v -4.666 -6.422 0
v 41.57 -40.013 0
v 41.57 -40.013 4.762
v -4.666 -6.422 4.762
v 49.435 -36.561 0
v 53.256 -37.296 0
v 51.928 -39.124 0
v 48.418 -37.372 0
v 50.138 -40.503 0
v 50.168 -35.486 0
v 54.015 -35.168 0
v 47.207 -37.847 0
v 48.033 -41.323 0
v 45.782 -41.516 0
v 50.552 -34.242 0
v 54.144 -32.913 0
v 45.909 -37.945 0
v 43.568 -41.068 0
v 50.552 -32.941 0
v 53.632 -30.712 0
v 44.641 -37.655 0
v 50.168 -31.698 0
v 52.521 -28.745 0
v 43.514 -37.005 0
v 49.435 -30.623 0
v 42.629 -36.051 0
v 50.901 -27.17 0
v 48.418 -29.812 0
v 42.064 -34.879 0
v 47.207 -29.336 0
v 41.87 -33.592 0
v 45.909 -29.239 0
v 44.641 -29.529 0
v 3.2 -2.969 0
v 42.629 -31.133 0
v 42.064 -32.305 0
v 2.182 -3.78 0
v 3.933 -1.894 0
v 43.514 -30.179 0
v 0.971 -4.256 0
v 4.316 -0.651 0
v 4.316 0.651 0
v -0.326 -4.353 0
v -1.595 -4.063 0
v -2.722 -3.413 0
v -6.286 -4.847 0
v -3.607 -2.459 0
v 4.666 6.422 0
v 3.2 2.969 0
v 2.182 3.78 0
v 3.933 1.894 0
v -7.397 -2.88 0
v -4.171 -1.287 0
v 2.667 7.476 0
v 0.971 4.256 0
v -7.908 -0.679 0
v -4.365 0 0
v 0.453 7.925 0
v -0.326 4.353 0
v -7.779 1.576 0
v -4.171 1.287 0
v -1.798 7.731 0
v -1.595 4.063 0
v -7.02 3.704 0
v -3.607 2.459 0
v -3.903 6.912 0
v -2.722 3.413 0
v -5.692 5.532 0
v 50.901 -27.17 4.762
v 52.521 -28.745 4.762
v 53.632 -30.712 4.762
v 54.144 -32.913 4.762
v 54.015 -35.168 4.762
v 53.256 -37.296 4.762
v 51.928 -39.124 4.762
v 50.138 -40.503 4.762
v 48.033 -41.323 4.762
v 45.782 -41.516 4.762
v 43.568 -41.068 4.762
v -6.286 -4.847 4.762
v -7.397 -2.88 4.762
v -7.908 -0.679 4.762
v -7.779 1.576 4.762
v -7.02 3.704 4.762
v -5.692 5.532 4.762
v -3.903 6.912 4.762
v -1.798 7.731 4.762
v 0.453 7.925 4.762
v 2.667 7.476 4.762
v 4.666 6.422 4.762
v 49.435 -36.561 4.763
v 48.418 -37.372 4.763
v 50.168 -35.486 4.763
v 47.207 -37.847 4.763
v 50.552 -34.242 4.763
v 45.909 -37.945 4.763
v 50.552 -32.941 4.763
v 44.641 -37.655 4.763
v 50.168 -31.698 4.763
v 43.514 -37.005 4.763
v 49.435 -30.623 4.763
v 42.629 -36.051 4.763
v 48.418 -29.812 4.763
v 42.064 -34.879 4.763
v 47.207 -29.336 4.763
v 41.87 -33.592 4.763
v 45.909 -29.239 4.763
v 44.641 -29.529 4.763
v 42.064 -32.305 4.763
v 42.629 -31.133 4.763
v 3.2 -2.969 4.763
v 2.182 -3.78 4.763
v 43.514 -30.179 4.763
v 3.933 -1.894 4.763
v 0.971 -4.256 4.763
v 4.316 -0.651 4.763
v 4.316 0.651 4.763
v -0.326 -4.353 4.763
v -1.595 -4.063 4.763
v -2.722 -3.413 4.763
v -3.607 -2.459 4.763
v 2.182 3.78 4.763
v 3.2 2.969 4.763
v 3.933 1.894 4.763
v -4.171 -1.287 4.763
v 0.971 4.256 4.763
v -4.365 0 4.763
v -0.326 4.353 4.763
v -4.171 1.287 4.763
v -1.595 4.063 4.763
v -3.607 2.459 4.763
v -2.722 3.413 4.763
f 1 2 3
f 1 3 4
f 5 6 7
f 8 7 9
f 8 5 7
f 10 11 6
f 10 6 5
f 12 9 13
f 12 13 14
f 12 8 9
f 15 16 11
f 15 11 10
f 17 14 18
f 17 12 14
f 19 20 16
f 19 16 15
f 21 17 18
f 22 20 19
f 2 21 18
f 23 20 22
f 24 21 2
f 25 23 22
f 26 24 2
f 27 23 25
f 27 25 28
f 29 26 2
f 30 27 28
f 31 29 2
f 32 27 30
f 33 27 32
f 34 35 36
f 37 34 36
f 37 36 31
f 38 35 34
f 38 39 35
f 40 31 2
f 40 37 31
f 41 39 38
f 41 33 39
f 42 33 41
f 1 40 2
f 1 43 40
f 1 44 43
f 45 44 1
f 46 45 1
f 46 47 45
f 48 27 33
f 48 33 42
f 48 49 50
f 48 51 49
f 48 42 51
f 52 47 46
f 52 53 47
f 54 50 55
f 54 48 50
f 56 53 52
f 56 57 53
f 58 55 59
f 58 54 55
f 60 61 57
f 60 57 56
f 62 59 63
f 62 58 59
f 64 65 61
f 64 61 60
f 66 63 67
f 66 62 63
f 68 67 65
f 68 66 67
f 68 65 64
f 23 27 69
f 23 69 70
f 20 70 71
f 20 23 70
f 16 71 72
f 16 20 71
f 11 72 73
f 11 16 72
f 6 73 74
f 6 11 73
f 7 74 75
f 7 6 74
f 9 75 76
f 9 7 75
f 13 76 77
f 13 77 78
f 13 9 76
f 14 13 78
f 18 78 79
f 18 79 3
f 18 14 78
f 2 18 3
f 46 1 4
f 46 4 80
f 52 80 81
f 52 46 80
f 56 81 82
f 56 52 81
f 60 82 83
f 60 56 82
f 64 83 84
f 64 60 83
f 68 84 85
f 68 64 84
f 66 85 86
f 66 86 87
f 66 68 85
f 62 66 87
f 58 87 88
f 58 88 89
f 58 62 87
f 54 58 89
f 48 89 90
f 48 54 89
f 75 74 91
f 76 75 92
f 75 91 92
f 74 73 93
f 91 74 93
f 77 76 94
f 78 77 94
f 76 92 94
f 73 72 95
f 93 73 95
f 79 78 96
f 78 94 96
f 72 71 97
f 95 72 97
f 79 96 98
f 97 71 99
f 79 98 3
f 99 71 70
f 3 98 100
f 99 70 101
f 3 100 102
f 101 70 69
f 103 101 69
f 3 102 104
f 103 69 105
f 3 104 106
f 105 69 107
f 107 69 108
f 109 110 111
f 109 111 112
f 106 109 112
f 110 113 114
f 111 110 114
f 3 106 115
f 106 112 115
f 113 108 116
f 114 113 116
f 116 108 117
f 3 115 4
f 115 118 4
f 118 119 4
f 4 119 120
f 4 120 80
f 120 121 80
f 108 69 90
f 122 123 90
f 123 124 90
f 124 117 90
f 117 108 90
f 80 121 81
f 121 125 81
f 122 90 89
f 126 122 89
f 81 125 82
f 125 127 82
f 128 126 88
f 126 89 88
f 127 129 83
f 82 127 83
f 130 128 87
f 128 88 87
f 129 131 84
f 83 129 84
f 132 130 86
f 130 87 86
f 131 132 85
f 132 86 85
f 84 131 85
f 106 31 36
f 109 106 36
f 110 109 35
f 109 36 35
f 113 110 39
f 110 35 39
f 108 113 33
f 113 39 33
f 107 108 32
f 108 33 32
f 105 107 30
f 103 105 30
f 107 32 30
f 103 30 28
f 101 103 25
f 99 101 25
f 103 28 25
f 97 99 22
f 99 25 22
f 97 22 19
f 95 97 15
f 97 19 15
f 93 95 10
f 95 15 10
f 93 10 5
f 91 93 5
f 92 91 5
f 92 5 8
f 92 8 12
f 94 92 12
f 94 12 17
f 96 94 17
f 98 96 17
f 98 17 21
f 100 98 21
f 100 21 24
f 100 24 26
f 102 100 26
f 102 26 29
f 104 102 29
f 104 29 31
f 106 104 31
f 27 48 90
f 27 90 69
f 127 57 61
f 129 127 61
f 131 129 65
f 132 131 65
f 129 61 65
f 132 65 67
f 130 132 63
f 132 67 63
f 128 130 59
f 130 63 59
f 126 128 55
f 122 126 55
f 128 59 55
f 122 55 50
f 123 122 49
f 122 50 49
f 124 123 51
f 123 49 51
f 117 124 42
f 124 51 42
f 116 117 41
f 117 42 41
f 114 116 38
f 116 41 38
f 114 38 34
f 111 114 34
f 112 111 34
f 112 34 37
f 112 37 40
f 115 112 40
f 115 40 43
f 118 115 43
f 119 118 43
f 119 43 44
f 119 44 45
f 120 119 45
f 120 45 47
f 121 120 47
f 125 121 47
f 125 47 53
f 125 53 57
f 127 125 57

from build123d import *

# Parameters (mm, degrees)
BOSS_EXTRUDE1_DEPTH          = 4.7625
F_5_16_CLEARANCE_HOLE1_D     = 8.72998
F_5_16_CLEARANCE_HOLE2_D     = 8.72998
F_5_16_CLEARANCE_HOLE2_DEPTH = 50.8
F_5_16_CLEARANCE_HOLE2_TIP   = 2.622750593


with BuildPart() as part:
    # Sketch1 → Boss-Extrude1 (new body)
    with BuildSketch(Plane.XY):
        with BuildLine():
            Line((4.66554544, 6.421572393), (50.900866669, -27.170354776))
            ThreePointArc((50.900866669, -27.170354776), (52.656893621, -38.257472609), (41.569775788, -40.013499561))
            Line((41.569775788, -40.013499561), (-4.66554544, -6.421572393))
            ThreePointArc((-4.66554544, -6.421572393), (-6.421572393, 4.66554544), (4.66554544, 6.421572393))
        make_face()
    extrude(amount=BOSS_EXTRUDE1_DEPTH)

    # 5/16 Clearance Hole1 (through all)
    with Locations(Plane.XY.offset(4.7625)):
        with Locations((0, 0), (46.235321229, -33.591927169)):
            Hole(F_5_16_CLEARANCE_HOLE1_D / 2)

    # 5/16 Clearance Hole2
    with Locations(Plane(origin=(-478.115792966, -1361.199382297, 4.7625), x_dir=(0.9364927793764423, 0.3506868605690643, 0), z_dir=(0, 0, 1))):
        with Locations((956.625522808, 1059.411749502)):
            Hole(F_5_16_CLEARANCE_HOLE2_D / 2, depth=F_5_16_CLEARANCE_HOLE2_DEPTH)
            with Locations((0, 0, -(F_5_16_CLEARANCE_HOLE2_DEPTH + F_5_16_CLEARANCE_HOLE2_TIP / 2))):  # 118° drill point
                Cone(0, F_5_16_CLEARANCE_HOLE2_D / 2, F_5_16_CLEARANCE_HOLE2_TIP, mode=Mode.SUBTRACT)


solid = part.part
